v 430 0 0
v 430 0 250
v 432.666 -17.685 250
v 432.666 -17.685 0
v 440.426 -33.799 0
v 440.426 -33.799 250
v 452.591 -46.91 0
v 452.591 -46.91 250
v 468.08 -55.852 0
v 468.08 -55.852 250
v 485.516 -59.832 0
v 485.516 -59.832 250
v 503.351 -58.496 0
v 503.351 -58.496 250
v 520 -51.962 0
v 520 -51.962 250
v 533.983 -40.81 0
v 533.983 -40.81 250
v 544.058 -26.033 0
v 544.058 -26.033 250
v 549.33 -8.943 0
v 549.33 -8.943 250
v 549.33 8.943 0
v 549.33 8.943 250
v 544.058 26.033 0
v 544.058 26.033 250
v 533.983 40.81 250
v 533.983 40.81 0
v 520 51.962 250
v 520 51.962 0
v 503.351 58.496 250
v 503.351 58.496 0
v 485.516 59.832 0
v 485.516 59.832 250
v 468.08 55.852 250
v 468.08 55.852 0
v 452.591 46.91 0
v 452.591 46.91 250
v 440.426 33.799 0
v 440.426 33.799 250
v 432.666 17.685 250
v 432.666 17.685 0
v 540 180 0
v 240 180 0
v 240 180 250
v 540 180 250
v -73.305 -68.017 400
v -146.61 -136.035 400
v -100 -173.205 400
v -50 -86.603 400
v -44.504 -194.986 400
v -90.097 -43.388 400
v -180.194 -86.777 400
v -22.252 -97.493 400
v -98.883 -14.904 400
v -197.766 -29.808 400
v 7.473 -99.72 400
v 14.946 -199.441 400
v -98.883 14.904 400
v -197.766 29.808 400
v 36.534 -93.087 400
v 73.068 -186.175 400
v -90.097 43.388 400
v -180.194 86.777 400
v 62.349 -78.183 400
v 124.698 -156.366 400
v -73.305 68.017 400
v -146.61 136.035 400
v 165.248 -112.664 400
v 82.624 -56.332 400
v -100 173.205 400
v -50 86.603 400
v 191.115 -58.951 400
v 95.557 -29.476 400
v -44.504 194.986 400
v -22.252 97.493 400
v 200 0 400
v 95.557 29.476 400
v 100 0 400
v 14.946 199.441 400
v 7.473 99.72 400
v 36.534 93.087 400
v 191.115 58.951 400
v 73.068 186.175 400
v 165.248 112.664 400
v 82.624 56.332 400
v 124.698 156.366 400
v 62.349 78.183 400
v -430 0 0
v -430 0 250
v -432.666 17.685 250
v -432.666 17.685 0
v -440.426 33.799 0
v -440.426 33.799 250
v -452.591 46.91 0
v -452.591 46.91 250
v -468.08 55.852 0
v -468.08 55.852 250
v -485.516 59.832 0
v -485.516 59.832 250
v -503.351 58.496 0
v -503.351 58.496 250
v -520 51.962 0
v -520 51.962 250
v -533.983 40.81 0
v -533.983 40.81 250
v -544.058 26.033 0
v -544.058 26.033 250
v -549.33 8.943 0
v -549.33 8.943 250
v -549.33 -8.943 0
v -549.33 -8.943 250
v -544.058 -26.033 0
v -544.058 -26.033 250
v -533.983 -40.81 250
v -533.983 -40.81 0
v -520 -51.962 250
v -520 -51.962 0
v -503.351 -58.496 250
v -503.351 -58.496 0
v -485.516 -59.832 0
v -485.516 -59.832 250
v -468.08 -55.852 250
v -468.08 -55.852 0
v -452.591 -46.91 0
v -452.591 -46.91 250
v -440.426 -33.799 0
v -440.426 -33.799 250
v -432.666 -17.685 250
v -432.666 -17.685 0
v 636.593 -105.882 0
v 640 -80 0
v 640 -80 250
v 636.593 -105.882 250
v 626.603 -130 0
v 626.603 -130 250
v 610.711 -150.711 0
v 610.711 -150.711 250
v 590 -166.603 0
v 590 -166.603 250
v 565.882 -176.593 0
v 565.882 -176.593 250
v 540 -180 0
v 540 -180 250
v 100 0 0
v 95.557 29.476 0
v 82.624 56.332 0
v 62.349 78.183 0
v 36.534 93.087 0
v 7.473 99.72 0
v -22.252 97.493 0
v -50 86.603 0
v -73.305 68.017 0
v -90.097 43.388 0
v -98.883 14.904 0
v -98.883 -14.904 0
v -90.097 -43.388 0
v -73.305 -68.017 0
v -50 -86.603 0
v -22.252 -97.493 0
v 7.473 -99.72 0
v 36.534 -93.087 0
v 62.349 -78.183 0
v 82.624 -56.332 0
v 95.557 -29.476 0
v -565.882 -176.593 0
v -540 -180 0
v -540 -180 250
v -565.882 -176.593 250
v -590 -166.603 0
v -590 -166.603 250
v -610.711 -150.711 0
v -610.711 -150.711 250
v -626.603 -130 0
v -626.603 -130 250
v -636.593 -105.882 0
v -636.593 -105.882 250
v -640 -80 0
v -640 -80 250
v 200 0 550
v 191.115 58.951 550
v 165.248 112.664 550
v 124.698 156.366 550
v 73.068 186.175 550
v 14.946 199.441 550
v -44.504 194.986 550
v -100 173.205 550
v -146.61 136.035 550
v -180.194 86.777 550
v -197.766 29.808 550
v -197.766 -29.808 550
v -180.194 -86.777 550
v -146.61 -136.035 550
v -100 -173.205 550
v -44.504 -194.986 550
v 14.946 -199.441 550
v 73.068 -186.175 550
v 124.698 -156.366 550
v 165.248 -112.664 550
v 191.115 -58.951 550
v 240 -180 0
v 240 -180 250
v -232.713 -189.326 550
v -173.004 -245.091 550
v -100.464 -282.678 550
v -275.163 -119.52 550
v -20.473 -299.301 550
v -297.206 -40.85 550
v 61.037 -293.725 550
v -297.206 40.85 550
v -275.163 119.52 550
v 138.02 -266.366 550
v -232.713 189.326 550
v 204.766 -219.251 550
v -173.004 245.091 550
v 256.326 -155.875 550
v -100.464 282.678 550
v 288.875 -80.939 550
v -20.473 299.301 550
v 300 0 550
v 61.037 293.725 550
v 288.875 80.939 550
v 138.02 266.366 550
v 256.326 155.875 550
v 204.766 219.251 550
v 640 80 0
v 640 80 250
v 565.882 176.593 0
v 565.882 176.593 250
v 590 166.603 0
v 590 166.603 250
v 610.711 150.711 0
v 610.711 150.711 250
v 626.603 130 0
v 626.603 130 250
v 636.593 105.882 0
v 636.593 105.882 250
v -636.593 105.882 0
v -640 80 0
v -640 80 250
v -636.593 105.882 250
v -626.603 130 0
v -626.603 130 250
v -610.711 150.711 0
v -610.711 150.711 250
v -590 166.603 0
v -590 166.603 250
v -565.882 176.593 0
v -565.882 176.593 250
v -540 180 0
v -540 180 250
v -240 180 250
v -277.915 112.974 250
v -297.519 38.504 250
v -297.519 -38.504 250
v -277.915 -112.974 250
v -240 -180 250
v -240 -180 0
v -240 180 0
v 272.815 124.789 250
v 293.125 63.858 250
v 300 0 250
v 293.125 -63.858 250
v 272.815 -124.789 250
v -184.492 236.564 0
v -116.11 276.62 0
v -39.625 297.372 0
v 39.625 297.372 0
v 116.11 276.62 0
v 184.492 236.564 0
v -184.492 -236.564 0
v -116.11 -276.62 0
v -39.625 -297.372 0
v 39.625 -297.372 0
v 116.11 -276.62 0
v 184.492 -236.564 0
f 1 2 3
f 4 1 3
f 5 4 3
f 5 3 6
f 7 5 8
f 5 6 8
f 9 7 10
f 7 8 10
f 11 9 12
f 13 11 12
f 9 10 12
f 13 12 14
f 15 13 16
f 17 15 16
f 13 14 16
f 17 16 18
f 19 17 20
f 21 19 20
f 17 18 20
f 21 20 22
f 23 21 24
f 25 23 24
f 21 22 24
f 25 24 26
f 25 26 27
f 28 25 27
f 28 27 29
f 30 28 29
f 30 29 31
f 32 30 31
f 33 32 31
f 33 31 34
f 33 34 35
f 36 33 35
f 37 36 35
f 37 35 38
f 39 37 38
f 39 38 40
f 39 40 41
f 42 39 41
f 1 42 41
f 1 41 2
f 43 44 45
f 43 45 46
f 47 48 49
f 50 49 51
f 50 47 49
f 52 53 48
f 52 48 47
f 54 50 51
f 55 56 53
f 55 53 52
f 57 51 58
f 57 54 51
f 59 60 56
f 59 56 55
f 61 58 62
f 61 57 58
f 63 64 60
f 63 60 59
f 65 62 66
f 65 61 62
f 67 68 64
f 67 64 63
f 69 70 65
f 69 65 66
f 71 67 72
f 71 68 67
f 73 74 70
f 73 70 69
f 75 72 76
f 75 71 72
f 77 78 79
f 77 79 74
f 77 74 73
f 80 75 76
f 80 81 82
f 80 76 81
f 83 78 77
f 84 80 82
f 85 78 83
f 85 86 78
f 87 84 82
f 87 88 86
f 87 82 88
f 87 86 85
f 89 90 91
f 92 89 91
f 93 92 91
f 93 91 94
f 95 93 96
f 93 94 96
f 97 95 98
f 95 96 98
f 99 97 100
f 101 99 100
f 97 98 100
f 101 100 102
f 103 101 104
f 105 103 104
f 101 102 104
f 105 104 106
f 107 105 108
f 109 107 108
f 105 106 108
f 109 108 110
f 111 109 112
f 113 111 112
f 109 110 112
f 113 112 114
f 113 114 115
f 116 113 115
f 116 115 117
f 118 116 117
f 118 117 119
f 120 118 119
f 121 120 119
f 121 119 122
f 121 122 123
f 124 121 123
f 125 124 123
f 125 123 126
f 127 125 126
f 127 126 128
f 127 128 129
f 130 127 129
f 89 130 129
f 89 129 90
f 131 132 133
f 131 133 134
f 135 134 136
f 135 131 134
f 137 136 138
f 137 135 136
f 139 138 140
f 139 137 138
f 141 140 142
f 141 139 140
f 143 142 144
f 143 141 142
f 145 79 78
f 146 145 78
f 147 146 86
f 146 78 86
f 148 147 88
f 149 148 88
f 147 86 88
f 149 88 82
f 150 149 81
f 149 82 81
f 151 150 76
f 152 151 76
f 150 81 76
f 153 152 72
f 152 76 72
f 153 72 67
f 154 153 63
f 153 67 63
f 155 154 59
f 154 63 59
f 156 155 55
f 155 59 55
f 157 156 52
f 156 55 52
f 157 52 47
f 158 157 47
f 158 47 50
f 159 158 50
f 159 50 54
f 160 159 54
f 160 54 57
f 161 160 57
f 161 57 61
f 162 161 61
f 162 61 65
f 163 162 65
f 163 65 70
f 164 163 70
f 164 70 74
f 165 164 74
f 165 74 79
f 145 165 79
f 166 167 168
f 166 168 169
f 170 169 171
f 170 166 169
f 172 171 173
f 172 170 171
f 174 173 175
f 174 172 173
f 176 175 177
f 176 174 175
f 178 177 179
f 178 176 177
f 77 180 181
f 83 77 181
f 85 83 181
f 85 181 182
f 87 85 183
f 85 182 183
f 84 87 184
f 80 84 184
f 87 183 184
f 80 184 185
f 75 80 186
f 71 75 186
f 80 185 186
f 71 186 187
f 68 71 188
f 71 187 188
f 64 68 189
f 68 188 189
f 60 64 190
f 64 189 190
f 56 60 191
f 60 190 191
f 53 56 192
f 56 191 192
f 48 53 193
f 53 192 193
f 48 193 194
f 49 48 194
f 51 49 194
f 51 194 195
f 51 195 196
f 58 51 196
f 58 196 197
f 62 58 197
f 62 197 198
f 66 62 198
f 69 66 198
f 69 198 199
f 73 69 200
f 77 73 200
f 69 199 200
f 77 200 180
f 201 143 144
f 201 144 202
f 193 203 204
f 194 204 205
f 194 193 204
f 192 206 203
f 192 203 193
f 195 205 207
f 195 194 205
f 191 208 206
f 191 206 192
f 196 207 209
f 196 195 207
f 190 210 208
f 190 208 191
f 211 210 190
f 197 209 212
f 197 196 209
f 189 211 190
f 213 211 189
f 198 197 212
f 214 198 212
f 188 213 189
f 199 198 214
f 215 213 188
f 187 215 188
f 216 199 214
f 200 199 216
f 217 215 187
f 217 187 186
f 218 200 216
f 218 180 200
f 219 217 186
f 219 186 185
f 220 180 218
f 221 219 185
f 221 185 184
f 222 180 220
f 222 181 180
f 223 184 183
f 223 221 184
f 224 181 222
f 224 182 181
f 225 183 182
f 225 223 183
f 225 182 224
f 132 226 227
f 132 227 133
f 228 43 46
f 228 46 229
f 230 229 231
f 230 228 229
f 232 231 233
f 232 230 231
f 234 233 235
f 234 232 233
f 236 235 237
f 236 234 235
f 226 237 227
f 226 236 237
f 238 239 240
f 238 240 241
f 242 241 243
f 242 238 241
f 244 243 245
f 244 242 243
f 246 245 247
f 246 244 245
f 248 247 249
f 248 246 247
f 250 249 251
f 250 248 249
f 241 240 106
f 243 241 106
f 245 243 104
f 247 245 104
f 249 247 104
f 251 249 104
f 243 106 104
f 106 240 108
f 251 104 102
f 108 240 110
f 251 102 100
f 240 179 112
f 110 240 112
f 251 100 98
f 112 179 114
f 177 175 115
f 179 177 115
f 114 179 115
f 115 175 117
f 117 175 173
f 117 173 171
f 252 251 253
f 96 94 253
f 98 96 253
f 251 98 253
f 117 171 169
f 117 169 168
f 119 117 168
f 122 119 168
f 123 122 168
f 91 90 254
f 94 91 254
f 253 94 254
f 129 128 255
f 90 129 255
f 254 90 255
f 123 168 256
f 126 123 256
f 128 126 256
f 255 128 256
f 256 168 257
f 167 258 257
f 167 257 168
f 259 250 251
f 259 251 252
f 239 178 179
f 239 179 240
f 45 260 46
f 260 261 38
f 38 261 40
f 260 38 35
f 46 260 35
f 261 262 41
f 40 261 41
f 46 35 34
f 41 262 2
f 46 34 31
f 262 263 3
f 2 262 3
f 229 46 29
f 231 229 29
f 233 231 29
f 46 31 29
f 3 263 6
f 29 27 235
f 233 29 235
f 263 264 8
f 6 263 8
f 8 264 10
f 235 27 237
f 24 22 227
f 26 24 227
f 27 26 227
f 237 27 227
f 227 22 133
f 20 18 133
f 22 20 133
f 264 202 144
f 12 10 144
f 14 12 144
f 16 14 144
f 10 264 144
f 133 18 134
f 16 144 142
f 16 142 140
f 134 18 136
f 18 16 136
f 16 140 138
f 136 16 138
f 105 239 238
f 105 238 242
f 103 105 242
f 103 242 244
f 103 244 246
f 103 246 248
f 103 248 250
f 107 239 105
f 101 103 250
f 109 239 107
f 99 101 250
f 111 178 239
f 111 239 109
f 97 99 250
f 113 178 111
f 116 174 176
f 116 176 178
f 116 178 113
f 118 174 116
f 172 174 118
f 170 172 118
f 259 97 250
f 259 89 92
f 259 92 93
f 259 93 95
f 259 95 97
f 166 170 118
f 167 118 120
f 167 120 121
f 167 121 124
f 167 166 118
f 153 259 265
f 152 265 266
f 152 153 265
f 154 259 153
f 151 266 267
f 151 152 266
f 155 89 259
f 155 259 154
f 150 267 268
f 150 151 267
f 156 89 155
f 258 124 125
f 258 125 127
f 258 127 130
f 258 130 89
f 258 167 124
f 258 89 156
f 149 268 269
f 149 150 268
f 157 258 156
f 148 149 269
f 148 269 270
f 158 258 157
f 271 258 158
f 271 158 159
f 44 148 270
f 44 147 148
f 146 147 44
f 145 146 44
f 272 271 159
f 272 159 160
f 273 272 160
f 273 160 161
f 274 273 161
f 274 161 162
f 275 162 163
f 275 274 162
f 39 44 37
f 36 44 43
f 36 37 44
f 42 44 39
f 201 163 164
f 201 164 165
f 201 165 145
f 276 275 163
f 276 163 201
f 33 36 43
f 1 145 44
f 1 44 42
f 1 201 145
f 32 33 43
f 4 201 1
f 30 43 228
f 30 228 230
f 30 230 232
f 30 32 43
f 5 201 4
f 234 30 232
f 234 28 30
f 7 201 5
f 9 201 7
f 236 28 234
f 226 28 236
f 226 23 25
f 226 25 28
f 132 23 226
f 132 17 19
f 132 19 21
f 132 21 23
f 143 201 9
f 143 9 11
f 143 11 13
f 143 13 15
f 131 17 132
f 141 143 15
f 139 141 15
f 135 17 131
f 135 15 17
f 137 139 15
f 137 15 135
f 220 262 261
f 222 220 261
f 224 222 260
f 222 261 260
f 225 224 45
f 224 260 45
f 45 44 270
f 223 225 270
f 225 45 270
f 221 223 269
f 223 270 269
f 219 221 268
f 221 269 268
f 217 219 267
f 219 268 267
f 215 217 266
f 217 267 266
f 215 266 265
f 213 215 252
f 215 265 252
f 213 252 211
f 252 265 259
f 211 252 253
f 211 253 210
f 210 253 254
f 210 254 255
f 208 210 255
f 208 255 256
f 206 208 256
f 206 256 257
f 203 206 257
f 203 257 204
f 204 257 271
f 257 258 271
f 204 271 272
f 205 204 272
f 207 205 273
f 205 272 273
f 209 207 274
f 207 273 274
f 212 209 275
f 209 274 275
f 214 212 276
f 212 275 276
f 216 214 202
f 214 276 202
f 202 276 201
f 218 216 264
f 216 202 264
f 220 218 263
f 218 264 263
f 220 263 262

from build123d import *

# Parameters (mm, degrees)
F1_R      = 300
F2_DEPTH  = 550
F3_R      = 200
F4_DEPTH  = 150
F5_R      = 100
F6_DEPTH  = 400.001
F8_DEPTH  = 250
F10_DEPTH = 250
F12_DEPTH = 250.001
F13_R     = 60
F14_DEPTH = 250.001


with BuildPart() as f2:
    # F1 (on Top) → F2 (new body)
    with BuildSketch(Plane.XY):
        Circle(F1_R)
    extrude(amount=F2_DEPTH)

    # F3 (on face) → F4 (cut)
    with BuildSketch(Plane.XY.offset(550)):
        Circle(F3_R)
    extrude(amount=-F4_DEPTH, mode=Mode.SUBTRACT)

    # F5 (on face) → F6 (cut, through all)
    with BuildSketch(Plane.XY.offset(400)):
        Circle(F5_R)
    extrude(amount=-F6_DEPTH, mode=Mode.SUBTRACT)

    # F7 (on face) → F8 (join)
    with BuildSketch(Plane(origin=(0, 0, 0), x_dir=(1, 0, 0), z_dir=(0, 0, -1))):
        with BuildLine():
            Line((-240, -180), (-240, 180))
            Line((-240, 180), (-540, 180))
            ThreePointArc((-540, 180), (-610.710678, 150.710678), (-640, 80))
            Line((-640, 80), (-640, -80))
            ThreePointArc((-640, -80), (-610.710678, -150.710678), (-540, -180))
            Line((-540, -180), (-240, -180))
        make_face()
    extrude(amount=-F8_DEPTH)

    # F9 (on face) → F10 (join)
    with BuildSketch(Plane(origin=(0, 0, 0), x_dir=(1, 0, 0), z_dir=(0, 0, -1))):
        with BuildLine():
            Line((540, 180), (240, 180))
            Line((240, 180), (240, -180))
            Line((240, -180), (540, -180))
            ThreePointArc((540, -180), (610.710678, -150.710678), (640, -80))
            Line((640, -80), (640, 80))
            ThreePointArc((640, 80), (610.710678, 150.710678), (540, 180))
        make_face()
    extrude(amount=-F10_DEPTH)

    # F11 (on face) → F12 (cut, through all)
    with BuildSketch(Plane.XY.offset(250)):
        with BuildLine():
            Line((430, 0), (550, 0))
            ThreePointArc((550, 0), (490, 60), (430, 0))
        make_face()
        with BuildLine():
            ThreePointArc((430, 0), (490, -60), (550, 0))
            Line((550, 0), (430, 0))
        make_face()
    extrude(amount=-F12_DEPTH, mode=Mode.SUBTRACT)

    # F13 (on face) → F14 (cut, through all)
    with BuildSketch(Plane.XY.offset(250)):
        with Locations((-490, 0)):
            Circle(F13_R)
    extrude(amount=-F14_DEPTH, mode=Mode.SUBTRACT)


solid = f2.part
